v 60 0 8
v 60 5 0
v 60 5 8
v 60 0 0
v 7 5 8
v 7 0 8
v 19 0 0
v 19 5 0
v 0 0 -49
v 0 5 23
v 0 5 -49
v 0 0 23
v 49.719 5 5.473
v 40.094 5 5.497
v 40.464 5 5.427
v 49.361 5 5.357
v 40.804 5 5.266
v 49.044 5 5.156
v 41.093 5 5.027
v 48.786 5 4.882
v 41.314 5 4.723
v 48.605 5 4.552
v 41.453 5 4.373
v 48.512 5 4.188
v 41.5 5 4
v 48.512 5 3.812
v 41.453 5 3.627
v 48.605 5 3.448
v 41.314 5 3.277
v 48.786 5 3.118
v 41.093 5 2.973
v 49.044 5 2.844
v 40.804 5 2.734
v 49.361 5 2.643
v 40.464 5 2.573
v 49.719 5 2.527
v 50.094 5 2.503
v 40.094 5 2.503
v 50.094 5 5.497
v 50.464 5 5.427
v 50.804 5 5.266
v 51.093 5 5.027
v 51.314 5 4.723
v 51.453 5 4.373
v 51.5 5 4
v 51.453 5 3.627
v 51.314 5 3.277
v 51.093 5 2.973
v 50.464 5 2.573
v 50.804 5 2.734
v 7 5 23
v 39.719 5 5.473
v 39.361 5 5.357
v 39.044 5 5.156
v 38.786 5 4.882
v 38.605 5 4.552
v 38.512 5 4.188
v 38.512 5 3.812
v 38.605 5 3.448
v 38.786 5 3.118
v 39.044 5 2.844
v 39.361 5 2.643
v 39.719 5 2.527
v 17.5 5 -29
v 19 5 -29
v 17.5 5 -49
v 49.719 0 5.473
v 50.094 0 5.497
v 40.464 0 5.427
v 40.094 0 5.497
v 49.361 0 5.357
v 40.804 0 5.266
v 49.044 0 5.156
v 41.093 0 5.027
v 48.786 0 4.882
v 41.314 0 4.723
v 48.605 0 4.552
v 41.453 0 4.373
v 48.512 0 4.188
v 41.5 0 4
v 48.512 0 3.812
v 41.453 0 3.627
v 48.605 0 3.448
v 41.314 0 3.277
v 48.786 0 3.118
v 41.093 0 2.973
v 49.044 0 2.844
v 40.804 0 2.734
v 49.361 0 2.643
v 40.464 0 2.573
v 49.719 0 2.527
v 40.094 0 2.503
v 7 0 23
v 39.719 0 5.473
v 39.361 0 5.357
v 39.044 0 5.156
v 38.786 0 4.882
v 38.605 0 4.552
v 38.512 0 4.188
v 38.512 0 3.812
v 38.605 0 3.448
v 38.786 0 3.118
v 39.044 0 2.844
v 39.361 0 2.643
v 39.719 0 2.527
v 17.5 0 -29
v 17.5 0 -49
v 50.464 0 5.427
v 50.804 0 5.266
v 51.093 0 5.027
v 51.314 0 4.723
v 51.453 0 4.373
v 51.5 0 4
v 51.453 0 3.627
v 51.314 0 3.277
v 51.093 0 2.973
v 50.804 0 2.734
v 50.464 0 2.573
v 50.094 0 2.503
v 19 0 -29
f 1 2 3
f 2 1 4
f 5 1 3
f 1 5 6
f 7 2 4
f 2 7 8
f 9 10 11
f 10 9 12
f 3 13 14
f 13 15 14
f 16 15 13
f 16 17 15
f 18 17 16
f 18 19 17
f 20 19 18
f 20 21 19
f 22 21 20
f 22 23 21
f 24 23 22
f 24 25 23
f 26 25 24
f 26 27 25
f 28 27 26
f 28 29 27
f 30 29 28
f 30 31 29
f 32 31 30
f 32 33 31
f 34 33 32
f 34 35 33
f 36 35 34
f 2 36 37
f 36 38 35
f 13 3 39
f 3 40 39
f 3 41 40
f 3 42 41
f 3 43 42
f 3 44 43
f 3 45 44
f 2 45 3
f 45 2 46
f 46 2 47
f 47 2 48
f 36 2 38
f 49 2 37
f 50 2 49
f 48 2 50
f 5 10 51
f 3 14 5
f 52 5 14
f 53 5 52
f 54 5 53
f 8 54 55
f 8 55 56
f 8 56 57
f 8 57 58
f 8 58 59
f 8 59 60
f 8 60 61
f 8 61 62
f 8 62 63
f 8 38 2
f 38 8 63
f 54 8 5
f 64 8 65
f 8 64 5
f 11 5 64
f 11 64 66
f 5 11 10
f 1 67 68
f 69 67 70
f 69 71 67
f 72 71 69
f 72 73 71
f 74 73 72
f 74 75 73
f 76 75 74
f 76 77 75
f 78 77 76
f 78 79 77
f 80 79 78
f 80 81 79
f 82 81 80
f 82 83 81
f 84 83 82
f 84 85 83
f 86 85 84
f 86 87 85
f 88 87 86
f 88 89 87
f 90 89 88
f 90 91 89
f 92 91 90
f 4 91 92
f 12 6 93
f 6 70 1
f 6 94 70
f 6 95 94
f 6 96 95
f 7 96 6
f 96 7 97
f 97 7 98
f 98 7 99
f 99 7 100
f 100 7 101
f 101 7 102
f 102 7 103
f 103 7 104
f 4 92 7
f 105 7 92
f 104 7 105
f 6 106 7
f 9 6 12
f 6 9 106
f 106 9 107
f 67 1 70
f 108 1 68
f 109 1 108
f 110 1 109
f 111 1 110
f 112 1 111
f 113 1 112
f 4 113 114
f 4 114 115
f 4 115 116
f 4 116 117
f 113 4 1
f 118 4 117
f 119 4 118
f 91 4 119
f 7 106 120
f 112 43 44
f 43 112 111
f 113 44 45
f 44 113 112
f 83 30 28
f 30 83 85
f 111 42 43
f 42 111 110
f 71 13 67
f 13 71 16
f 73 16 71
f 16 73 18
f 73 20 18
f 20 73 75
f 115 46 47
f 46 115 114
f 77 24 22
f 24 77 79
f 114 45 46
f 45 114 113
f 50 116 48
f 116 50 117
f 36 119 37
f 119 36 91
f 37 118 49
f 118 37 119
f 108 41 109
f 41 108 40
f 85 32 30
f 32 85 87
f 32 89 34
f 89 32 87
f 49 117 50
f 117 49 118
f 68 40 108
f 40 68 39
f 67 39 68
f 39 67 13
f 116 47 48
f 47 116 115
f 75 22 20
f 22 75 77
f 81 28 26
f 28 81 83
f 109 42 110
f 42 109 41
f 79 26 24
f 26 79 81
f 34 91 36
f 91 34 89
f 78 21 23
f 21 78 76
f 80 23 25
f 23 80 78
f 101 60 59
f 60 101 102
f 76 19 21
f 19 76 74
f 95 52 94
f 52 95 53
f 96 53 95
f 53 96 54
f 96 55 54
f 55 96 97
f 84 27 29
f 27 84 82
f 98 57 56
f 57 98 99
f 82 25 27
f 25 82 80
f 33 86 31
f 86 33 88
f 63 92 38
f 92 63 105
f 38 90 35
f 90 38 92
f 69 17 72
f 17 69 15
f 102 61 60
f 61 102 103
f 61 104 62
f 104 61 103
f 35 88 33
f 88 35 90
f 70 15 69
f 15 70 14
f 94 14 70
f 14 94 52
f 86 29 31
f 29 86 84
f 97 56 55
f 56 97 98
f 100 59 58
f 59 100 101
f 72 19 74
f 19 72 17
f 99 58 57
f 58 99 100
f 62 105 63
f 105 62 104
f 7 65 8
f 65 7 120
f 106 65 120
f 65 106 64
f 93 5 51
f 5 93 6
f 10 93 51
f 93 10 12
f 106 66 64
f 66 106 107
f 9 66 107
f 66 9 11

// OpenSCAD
// wall-table-part
distanceUpperTable = 19;
distanceLowerTable = 17.5;
thicknessUpperTable = 29;
thicknessLowerTable = 20;
overshootHeight = 15;
overshootDepth = 7;
topPartLength = 60;
topPartHeight = 8;
thickness = 5;
holeDiameter = 3;
hole1Offset = 10;
hole2Offset = 20;

module wallTablePart() {

  // top part
  difference() {
    translate([0, 0, 0])
      cube(size=[topPartLength, thickness, topPartHeight], center=false);
    translate([topPartLength - hole1Offset, thickness, holeDiameter/2 + (topPartHeight-holeDiameter)/2])
      rotate([90, 0, 0])
        #cylinder(d=holeDiameter, h=thickness, center=false, $fn=25);
    translate([topPartLength - hole2Offset, thickness, holeDiameter/2 + (topPartHeight-holeDiameter)/2])
      rotate([90, 0, 0])
        #cylinder(d=holeDiameter, h=thickness, center=false, $fn=25);
  }
  // upper table part
  translate([0, 0, -thicknessUpperTable])
    cube(size=[distanceUpperTable, thickness, thicknessUpperTable], center=false);
  // overshoot
  translate([0, 0, topPartHeight])
    cube(size=[overshootDepth, thickness, overshootHeight], center=false);
  // lower table part
  translate([0, 0, -(thicknessLowerTable + thicknessUpperTable)])
    cube(size=[distanceLowerTable, thickness, thicknessLowerTable], center=false);
  
}


wallTablePart();
